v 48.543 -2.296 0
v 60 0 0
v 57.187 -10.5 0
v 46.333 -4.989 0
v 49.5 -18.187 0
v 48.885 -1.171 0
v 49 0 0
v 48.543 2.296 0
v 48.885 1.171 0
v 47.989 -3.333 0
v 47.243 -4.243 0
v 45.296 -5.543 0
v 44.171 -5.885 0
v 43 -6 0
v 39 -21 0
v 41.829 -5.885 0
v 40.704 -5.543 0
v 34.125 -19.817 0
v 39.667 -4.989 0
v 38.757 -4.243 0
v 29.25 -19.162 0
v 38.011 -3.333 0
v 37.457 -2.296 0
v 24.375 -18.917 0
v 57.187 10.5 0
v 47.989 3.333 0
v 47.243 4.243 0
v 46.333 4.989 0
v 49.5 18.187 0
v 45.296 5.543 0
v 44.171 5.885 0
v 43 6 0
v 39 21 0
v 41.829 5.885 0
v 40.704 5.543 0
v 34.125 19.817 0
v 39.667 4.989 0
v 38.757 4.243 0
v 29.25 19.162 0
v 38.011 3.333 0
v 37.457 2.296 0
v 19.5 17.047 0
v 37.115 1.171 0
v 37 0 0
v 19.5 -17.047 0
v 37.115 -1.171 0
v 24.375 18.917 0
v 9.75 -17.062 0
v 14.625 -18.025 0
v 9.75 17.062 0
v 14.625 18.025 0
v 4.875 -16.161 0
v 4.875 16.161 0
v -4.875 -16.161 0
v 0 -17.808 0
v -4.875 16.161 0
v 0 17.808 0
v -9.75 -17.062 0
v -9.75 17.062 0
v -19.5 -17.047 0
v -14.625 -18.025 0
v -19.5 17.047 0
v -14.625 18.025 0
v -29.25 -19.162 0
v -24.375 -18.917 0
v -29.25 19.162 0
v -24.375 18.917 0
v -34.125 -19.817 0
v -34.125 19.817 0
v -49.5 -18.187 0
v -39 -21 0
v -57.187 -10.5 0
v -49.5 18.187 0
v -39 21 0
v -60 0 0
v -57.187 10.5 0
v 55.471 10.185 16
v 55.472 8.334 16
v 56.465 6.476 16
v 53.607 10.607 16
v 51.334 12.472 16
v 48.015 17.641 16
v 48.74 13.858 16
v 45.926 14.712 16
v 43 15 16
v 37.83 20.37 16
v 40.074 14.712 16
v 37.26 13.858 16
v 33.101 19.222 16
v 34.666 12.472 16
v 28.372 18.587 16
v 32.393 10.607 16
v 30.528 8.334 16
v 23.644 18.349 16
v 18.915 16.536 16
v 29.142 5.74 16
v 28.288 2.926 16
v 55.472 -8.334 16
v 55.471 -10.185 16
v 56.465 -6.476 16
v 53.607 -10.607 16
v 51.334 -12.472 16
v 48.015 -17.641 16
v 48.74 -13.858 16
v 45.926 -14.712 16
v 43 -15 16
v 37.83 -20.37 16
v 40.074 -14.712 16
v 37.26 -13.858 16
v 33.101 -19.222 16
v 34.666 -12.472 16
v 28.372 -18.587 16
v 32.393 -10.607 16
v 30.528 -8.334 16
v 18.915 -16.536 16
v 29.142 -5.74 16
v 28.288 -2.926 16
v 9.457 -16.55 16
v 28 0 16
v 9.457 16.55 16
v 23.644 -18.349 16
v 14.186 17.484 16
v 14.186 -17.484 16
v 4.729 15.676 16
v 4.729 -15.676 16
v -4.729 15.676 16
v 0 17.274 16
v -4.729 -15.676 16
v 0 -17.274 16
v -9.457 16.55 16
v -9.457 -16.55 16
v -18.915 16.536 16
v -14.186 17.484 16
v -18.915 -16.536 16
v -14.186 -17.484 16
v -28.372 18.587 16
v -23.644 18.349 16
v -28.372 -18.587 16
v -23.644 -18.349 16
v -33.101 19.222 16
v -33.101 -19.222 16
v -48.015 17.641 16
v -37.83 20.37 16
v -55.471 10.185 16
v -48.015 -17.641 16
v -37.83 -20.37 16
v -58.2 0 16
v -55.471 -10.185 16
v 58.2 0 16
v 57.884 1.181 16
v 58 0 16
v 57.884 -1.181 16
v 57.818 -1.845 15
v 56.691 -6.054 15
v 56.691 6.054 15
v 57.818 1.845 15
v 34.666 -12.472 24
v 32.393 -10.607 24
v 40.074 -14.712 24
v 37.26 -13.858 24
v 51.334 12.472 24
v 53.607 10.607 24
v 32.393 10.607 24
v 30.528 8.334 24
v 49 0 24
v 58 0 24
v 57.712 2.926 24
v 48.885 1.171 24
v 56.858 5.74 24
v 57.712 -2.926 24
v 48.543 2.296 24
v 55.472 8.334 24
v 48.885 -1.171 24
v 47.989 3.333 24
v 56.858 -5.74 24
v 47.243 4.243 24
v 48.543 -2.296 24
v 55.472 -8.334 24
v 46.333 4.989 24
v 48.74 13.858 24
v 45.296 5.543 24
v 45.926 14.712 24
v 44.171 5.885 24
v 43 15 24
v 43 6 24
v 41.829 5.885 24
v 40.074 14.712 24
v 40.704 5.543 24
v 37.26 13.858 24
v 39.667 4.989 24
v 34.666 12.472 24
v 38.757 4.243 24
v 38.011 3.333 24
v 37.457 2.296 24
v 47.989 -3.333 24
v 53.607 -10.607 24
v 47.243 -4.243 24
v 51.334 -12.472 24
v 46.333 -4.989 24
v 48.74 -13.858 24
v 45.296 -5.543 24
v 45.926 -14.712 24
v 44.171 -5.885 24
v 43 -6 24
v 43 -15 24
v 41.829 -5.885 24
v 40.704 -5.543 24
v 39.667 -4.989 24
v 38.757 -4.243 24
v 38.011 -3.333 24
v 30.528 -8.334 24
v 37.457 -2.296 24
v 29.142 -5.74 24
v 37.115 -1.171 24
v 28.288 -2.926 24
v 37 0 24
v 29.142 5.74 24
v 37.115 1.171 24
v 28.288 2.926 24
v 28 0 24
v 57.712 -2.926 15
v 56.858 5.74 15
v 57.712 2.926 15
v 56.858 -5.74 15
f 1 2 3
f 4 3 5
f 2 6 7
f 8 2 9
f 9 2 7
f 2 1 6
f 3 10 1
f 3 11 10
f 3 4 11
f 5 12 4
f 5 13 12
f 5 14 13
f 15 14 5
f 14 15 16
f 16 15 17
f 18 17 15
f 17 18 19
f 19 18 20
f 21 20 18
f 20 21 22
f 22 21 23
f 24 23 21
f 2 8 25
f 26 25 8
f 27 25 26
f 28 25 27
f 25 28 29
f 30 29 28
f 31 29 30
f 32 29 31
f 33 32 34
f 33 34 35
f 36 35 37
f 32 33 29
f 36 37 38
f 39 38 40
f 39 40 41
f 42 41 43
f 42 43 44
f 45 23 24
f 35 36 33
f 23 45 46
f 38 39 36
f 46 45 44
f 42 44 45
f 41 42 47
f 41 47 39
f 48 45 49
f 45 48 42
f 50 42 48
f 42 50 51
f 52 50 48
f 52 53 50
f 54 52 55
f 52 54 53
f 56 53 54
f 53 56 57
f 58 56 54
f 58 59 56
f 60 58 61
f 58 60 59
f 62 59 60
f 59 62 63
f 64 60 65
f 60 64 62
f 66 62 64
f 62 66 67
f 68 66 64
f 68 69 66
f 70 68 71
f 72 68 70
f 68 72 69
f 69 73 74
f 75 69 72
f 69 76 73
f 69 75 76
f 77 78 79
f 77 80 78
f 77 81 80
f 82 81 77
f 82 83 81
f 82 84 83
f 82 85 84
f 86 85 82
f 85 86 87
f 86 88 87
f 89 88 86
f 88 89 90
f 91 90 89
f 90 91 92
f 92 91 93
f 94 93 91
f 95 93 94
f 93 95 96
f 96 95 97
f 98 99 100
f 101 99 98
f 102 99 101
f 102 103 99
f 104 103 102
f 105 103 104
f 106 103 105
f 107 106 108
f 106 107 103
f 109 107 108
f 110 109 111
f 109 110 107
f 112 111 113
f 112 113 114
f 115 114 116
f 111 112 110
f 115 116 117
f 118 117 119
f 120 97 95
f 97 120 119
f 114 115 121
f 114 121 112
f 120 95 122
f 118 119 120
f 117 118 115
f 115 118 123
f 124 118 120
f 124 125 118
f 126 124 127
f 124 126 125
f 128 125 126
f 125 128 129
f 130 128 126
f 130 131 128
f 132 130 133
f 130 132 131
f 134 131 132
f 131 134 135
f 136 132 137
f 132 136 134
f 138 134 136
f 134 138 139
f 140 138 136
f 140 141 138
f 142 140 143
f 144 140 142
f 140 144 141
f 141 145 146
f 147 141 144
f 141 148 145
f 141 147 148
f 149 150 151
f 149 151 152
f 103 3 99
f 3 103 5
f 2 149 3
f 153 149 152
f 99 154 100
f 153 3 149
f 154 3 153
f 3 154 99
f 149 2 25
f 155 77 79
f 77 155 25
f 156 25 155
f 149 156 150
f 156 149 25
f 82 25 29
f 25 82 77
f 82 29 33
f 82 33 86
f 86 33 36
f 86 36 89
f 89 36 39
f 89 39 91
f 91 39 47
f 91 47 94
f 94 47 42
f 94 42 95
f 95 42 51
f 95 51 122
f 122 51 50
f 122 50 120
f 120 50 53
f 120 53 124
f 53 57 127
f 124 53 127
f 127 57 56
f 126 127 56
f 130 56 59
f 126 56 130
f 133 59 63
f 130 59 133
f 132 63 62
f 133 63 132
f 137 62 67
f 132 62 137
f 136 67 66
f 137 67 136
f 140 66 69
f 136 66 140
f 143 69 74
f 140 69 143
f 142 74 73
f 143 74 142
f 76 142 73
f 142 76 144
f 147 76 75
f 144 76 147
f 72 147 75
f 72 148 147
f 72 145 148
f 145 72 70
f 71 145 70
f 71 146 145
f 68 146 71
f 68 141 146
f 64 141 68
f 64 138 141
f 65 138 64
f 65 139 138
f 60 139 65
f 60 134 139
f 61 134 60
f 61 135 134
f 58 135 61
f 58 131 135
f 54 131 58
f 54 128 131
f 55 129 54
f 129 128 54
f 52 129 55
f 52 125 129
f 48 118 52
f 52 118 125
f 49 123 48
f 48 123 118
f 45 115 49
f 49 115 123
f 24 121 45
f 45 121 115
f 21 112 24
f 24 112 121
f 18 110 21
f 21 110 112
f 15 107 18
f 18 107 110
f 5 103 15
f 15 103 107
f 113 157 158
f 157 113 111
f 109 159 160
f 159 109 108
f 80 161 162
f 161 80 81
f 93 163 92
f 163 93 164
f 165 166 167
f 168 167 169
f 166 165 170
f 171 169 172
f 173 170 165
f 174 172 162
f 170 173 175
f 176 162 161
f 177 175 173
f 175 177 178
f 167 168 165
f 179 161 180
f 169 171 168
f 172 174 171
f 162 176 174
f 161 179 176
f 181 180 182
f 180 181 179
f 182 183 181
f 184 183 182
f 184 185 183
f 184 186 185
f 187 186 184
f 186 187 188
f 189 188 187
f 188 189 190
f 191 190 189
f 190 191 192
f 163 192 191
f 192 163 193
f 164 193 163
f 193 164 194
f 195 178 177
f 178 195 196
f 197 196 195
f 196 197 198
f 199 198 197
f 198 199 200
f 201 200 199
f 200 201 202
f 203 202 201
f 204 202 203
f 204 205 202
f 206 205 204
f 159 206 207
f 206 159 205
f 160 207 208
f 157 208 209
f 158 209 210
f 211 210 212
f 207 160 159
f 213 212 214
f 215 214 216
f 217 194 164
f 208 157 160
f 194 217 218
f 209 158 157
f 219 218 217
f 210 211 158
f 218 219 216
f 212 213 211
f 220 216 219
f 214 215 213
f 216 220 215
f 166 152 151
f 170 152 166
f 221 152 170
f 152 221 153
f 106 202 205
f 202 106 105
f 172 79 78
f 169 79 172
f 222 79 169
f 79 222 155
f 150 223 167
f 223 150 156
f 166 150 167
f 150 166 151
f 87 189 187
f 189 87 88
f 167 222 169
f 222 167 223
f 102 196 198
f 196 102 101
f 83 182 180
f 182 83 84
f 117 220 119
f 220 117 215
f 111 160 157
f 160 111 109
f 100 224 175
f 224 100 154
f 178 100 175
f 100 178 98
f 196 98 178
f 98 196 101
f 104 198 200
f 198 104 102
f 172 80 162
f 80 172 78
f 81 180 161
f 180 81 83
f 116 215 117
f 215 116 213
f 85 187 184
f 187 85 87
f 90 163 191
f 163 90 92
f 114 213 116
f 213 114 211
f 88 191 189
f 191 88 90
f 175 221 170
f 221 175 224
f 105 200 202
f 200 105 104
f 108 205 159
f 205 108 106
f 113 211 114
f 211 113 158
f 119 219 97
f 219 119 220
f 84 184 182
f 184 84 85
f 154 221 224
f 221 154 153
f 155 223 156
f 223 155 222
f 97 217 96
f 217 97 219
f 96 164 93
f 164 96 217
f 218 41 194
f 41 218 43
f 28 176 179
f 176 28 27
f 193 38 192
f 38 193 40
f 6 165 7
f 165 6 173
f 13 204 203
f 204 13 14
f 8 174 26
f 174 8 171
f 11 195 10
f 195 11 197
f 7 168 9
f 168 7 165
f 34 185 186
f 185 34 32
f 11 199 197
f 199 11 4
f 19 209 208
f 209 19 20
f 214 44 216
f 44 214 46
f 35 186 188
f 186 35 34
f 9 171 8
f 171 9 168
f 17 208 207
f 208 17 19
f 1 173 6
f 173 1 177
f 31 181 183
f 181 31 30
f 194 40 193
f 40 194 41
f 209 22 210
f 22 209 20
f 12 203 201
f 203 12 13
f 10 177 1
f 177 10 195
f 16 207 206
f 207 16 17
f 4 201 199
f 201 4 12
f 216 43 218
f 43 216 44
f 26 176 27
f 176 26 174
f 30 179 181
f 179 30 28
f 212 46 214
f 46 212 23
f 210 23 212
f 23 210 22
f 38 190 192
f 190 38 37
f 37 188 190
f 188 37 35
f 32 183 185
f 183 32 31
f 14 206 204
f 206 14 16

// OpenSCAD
$fn = 32;

// ----------------------------------------------------------------------
// Handle: 120 x 42 mm grip, 16 mm thick
// ----------------------------------------------------------------------

// --- parameters (mm) ---
length = 120;             // grip length
width = 42;               // grip width
thickness = 16;           // grip thickness
waist = 0.8;              // width factor at the middle
draft = 0.97;             // top face scale of the extrusion
scallops = 6;             // finger rests per side
ripple = 0.06;            // depth factor of the finger rests
boss_d = 30;              // mounting boss diameter
boss_h = 8;               // mounting boss height
boss_hole_d = 12;         // screw clearance through the boss
boss_r = 43;              // boss centre from the grip centre

/* ergonomic grip outline, closed spline-like polygon in the XY plane */
grip = [[-39, 21], [-34.125, 19.817], [-29.25, 19.162], [-24.375, 18.917], [-19.5, 17.047], [-14.625, 18.025], [-9.75, 17.062], [-4.875, 16.161], [0, 17.808], [4.875, 16.161], [9.75, 17.062], [14.625, 18.025], [19.5, 17.047], [24.375, 18.917], [29.25, 19.162], [34.125, 19.817], [39, 21], [49.5, 18.187], [57.187, 10.5], [60, 0], [57.187, -10.5], [49.5, -18.187], [39, -21], [39, -21], [34.125, -19.817], [29.25, -19.162], [24.375, -18.917], [19.5, -17.047], [14.625, -18.025], [9.75, -17.062], [4.875, -16.161], [0, -17.808], [-4.875, -16.161], [-9.75, -17.062], [-14.625, -18.025], [-19.5, -17.047], [-24.375, -18.917], [-29.25, -19.162], [-34.125, -19.817], [-39, -21], [-49.5, -18.187], [-57.187, -10.5], [-60, 0], [-57.187, 10.5], [-49.5, 18.187], [-39, 21]];

module grip_body() {
  linear_extrude(height = thickness, scale = draft) polygon(grip);
}

module boss_body() {
  /* sunk 1 mm into the grip so the joint overlaps */
  translate([boss_r, 0, thickness - 1]) cylinder(h = boss_h + 1, d = boss_d);
}

difference() {
  union() {
    grip_body();
    boss_body();
  }
  translate([boss_r, 0, -1]) cylinder(h = thickness + boss_h + 2, d = boss_hole_d);
}
